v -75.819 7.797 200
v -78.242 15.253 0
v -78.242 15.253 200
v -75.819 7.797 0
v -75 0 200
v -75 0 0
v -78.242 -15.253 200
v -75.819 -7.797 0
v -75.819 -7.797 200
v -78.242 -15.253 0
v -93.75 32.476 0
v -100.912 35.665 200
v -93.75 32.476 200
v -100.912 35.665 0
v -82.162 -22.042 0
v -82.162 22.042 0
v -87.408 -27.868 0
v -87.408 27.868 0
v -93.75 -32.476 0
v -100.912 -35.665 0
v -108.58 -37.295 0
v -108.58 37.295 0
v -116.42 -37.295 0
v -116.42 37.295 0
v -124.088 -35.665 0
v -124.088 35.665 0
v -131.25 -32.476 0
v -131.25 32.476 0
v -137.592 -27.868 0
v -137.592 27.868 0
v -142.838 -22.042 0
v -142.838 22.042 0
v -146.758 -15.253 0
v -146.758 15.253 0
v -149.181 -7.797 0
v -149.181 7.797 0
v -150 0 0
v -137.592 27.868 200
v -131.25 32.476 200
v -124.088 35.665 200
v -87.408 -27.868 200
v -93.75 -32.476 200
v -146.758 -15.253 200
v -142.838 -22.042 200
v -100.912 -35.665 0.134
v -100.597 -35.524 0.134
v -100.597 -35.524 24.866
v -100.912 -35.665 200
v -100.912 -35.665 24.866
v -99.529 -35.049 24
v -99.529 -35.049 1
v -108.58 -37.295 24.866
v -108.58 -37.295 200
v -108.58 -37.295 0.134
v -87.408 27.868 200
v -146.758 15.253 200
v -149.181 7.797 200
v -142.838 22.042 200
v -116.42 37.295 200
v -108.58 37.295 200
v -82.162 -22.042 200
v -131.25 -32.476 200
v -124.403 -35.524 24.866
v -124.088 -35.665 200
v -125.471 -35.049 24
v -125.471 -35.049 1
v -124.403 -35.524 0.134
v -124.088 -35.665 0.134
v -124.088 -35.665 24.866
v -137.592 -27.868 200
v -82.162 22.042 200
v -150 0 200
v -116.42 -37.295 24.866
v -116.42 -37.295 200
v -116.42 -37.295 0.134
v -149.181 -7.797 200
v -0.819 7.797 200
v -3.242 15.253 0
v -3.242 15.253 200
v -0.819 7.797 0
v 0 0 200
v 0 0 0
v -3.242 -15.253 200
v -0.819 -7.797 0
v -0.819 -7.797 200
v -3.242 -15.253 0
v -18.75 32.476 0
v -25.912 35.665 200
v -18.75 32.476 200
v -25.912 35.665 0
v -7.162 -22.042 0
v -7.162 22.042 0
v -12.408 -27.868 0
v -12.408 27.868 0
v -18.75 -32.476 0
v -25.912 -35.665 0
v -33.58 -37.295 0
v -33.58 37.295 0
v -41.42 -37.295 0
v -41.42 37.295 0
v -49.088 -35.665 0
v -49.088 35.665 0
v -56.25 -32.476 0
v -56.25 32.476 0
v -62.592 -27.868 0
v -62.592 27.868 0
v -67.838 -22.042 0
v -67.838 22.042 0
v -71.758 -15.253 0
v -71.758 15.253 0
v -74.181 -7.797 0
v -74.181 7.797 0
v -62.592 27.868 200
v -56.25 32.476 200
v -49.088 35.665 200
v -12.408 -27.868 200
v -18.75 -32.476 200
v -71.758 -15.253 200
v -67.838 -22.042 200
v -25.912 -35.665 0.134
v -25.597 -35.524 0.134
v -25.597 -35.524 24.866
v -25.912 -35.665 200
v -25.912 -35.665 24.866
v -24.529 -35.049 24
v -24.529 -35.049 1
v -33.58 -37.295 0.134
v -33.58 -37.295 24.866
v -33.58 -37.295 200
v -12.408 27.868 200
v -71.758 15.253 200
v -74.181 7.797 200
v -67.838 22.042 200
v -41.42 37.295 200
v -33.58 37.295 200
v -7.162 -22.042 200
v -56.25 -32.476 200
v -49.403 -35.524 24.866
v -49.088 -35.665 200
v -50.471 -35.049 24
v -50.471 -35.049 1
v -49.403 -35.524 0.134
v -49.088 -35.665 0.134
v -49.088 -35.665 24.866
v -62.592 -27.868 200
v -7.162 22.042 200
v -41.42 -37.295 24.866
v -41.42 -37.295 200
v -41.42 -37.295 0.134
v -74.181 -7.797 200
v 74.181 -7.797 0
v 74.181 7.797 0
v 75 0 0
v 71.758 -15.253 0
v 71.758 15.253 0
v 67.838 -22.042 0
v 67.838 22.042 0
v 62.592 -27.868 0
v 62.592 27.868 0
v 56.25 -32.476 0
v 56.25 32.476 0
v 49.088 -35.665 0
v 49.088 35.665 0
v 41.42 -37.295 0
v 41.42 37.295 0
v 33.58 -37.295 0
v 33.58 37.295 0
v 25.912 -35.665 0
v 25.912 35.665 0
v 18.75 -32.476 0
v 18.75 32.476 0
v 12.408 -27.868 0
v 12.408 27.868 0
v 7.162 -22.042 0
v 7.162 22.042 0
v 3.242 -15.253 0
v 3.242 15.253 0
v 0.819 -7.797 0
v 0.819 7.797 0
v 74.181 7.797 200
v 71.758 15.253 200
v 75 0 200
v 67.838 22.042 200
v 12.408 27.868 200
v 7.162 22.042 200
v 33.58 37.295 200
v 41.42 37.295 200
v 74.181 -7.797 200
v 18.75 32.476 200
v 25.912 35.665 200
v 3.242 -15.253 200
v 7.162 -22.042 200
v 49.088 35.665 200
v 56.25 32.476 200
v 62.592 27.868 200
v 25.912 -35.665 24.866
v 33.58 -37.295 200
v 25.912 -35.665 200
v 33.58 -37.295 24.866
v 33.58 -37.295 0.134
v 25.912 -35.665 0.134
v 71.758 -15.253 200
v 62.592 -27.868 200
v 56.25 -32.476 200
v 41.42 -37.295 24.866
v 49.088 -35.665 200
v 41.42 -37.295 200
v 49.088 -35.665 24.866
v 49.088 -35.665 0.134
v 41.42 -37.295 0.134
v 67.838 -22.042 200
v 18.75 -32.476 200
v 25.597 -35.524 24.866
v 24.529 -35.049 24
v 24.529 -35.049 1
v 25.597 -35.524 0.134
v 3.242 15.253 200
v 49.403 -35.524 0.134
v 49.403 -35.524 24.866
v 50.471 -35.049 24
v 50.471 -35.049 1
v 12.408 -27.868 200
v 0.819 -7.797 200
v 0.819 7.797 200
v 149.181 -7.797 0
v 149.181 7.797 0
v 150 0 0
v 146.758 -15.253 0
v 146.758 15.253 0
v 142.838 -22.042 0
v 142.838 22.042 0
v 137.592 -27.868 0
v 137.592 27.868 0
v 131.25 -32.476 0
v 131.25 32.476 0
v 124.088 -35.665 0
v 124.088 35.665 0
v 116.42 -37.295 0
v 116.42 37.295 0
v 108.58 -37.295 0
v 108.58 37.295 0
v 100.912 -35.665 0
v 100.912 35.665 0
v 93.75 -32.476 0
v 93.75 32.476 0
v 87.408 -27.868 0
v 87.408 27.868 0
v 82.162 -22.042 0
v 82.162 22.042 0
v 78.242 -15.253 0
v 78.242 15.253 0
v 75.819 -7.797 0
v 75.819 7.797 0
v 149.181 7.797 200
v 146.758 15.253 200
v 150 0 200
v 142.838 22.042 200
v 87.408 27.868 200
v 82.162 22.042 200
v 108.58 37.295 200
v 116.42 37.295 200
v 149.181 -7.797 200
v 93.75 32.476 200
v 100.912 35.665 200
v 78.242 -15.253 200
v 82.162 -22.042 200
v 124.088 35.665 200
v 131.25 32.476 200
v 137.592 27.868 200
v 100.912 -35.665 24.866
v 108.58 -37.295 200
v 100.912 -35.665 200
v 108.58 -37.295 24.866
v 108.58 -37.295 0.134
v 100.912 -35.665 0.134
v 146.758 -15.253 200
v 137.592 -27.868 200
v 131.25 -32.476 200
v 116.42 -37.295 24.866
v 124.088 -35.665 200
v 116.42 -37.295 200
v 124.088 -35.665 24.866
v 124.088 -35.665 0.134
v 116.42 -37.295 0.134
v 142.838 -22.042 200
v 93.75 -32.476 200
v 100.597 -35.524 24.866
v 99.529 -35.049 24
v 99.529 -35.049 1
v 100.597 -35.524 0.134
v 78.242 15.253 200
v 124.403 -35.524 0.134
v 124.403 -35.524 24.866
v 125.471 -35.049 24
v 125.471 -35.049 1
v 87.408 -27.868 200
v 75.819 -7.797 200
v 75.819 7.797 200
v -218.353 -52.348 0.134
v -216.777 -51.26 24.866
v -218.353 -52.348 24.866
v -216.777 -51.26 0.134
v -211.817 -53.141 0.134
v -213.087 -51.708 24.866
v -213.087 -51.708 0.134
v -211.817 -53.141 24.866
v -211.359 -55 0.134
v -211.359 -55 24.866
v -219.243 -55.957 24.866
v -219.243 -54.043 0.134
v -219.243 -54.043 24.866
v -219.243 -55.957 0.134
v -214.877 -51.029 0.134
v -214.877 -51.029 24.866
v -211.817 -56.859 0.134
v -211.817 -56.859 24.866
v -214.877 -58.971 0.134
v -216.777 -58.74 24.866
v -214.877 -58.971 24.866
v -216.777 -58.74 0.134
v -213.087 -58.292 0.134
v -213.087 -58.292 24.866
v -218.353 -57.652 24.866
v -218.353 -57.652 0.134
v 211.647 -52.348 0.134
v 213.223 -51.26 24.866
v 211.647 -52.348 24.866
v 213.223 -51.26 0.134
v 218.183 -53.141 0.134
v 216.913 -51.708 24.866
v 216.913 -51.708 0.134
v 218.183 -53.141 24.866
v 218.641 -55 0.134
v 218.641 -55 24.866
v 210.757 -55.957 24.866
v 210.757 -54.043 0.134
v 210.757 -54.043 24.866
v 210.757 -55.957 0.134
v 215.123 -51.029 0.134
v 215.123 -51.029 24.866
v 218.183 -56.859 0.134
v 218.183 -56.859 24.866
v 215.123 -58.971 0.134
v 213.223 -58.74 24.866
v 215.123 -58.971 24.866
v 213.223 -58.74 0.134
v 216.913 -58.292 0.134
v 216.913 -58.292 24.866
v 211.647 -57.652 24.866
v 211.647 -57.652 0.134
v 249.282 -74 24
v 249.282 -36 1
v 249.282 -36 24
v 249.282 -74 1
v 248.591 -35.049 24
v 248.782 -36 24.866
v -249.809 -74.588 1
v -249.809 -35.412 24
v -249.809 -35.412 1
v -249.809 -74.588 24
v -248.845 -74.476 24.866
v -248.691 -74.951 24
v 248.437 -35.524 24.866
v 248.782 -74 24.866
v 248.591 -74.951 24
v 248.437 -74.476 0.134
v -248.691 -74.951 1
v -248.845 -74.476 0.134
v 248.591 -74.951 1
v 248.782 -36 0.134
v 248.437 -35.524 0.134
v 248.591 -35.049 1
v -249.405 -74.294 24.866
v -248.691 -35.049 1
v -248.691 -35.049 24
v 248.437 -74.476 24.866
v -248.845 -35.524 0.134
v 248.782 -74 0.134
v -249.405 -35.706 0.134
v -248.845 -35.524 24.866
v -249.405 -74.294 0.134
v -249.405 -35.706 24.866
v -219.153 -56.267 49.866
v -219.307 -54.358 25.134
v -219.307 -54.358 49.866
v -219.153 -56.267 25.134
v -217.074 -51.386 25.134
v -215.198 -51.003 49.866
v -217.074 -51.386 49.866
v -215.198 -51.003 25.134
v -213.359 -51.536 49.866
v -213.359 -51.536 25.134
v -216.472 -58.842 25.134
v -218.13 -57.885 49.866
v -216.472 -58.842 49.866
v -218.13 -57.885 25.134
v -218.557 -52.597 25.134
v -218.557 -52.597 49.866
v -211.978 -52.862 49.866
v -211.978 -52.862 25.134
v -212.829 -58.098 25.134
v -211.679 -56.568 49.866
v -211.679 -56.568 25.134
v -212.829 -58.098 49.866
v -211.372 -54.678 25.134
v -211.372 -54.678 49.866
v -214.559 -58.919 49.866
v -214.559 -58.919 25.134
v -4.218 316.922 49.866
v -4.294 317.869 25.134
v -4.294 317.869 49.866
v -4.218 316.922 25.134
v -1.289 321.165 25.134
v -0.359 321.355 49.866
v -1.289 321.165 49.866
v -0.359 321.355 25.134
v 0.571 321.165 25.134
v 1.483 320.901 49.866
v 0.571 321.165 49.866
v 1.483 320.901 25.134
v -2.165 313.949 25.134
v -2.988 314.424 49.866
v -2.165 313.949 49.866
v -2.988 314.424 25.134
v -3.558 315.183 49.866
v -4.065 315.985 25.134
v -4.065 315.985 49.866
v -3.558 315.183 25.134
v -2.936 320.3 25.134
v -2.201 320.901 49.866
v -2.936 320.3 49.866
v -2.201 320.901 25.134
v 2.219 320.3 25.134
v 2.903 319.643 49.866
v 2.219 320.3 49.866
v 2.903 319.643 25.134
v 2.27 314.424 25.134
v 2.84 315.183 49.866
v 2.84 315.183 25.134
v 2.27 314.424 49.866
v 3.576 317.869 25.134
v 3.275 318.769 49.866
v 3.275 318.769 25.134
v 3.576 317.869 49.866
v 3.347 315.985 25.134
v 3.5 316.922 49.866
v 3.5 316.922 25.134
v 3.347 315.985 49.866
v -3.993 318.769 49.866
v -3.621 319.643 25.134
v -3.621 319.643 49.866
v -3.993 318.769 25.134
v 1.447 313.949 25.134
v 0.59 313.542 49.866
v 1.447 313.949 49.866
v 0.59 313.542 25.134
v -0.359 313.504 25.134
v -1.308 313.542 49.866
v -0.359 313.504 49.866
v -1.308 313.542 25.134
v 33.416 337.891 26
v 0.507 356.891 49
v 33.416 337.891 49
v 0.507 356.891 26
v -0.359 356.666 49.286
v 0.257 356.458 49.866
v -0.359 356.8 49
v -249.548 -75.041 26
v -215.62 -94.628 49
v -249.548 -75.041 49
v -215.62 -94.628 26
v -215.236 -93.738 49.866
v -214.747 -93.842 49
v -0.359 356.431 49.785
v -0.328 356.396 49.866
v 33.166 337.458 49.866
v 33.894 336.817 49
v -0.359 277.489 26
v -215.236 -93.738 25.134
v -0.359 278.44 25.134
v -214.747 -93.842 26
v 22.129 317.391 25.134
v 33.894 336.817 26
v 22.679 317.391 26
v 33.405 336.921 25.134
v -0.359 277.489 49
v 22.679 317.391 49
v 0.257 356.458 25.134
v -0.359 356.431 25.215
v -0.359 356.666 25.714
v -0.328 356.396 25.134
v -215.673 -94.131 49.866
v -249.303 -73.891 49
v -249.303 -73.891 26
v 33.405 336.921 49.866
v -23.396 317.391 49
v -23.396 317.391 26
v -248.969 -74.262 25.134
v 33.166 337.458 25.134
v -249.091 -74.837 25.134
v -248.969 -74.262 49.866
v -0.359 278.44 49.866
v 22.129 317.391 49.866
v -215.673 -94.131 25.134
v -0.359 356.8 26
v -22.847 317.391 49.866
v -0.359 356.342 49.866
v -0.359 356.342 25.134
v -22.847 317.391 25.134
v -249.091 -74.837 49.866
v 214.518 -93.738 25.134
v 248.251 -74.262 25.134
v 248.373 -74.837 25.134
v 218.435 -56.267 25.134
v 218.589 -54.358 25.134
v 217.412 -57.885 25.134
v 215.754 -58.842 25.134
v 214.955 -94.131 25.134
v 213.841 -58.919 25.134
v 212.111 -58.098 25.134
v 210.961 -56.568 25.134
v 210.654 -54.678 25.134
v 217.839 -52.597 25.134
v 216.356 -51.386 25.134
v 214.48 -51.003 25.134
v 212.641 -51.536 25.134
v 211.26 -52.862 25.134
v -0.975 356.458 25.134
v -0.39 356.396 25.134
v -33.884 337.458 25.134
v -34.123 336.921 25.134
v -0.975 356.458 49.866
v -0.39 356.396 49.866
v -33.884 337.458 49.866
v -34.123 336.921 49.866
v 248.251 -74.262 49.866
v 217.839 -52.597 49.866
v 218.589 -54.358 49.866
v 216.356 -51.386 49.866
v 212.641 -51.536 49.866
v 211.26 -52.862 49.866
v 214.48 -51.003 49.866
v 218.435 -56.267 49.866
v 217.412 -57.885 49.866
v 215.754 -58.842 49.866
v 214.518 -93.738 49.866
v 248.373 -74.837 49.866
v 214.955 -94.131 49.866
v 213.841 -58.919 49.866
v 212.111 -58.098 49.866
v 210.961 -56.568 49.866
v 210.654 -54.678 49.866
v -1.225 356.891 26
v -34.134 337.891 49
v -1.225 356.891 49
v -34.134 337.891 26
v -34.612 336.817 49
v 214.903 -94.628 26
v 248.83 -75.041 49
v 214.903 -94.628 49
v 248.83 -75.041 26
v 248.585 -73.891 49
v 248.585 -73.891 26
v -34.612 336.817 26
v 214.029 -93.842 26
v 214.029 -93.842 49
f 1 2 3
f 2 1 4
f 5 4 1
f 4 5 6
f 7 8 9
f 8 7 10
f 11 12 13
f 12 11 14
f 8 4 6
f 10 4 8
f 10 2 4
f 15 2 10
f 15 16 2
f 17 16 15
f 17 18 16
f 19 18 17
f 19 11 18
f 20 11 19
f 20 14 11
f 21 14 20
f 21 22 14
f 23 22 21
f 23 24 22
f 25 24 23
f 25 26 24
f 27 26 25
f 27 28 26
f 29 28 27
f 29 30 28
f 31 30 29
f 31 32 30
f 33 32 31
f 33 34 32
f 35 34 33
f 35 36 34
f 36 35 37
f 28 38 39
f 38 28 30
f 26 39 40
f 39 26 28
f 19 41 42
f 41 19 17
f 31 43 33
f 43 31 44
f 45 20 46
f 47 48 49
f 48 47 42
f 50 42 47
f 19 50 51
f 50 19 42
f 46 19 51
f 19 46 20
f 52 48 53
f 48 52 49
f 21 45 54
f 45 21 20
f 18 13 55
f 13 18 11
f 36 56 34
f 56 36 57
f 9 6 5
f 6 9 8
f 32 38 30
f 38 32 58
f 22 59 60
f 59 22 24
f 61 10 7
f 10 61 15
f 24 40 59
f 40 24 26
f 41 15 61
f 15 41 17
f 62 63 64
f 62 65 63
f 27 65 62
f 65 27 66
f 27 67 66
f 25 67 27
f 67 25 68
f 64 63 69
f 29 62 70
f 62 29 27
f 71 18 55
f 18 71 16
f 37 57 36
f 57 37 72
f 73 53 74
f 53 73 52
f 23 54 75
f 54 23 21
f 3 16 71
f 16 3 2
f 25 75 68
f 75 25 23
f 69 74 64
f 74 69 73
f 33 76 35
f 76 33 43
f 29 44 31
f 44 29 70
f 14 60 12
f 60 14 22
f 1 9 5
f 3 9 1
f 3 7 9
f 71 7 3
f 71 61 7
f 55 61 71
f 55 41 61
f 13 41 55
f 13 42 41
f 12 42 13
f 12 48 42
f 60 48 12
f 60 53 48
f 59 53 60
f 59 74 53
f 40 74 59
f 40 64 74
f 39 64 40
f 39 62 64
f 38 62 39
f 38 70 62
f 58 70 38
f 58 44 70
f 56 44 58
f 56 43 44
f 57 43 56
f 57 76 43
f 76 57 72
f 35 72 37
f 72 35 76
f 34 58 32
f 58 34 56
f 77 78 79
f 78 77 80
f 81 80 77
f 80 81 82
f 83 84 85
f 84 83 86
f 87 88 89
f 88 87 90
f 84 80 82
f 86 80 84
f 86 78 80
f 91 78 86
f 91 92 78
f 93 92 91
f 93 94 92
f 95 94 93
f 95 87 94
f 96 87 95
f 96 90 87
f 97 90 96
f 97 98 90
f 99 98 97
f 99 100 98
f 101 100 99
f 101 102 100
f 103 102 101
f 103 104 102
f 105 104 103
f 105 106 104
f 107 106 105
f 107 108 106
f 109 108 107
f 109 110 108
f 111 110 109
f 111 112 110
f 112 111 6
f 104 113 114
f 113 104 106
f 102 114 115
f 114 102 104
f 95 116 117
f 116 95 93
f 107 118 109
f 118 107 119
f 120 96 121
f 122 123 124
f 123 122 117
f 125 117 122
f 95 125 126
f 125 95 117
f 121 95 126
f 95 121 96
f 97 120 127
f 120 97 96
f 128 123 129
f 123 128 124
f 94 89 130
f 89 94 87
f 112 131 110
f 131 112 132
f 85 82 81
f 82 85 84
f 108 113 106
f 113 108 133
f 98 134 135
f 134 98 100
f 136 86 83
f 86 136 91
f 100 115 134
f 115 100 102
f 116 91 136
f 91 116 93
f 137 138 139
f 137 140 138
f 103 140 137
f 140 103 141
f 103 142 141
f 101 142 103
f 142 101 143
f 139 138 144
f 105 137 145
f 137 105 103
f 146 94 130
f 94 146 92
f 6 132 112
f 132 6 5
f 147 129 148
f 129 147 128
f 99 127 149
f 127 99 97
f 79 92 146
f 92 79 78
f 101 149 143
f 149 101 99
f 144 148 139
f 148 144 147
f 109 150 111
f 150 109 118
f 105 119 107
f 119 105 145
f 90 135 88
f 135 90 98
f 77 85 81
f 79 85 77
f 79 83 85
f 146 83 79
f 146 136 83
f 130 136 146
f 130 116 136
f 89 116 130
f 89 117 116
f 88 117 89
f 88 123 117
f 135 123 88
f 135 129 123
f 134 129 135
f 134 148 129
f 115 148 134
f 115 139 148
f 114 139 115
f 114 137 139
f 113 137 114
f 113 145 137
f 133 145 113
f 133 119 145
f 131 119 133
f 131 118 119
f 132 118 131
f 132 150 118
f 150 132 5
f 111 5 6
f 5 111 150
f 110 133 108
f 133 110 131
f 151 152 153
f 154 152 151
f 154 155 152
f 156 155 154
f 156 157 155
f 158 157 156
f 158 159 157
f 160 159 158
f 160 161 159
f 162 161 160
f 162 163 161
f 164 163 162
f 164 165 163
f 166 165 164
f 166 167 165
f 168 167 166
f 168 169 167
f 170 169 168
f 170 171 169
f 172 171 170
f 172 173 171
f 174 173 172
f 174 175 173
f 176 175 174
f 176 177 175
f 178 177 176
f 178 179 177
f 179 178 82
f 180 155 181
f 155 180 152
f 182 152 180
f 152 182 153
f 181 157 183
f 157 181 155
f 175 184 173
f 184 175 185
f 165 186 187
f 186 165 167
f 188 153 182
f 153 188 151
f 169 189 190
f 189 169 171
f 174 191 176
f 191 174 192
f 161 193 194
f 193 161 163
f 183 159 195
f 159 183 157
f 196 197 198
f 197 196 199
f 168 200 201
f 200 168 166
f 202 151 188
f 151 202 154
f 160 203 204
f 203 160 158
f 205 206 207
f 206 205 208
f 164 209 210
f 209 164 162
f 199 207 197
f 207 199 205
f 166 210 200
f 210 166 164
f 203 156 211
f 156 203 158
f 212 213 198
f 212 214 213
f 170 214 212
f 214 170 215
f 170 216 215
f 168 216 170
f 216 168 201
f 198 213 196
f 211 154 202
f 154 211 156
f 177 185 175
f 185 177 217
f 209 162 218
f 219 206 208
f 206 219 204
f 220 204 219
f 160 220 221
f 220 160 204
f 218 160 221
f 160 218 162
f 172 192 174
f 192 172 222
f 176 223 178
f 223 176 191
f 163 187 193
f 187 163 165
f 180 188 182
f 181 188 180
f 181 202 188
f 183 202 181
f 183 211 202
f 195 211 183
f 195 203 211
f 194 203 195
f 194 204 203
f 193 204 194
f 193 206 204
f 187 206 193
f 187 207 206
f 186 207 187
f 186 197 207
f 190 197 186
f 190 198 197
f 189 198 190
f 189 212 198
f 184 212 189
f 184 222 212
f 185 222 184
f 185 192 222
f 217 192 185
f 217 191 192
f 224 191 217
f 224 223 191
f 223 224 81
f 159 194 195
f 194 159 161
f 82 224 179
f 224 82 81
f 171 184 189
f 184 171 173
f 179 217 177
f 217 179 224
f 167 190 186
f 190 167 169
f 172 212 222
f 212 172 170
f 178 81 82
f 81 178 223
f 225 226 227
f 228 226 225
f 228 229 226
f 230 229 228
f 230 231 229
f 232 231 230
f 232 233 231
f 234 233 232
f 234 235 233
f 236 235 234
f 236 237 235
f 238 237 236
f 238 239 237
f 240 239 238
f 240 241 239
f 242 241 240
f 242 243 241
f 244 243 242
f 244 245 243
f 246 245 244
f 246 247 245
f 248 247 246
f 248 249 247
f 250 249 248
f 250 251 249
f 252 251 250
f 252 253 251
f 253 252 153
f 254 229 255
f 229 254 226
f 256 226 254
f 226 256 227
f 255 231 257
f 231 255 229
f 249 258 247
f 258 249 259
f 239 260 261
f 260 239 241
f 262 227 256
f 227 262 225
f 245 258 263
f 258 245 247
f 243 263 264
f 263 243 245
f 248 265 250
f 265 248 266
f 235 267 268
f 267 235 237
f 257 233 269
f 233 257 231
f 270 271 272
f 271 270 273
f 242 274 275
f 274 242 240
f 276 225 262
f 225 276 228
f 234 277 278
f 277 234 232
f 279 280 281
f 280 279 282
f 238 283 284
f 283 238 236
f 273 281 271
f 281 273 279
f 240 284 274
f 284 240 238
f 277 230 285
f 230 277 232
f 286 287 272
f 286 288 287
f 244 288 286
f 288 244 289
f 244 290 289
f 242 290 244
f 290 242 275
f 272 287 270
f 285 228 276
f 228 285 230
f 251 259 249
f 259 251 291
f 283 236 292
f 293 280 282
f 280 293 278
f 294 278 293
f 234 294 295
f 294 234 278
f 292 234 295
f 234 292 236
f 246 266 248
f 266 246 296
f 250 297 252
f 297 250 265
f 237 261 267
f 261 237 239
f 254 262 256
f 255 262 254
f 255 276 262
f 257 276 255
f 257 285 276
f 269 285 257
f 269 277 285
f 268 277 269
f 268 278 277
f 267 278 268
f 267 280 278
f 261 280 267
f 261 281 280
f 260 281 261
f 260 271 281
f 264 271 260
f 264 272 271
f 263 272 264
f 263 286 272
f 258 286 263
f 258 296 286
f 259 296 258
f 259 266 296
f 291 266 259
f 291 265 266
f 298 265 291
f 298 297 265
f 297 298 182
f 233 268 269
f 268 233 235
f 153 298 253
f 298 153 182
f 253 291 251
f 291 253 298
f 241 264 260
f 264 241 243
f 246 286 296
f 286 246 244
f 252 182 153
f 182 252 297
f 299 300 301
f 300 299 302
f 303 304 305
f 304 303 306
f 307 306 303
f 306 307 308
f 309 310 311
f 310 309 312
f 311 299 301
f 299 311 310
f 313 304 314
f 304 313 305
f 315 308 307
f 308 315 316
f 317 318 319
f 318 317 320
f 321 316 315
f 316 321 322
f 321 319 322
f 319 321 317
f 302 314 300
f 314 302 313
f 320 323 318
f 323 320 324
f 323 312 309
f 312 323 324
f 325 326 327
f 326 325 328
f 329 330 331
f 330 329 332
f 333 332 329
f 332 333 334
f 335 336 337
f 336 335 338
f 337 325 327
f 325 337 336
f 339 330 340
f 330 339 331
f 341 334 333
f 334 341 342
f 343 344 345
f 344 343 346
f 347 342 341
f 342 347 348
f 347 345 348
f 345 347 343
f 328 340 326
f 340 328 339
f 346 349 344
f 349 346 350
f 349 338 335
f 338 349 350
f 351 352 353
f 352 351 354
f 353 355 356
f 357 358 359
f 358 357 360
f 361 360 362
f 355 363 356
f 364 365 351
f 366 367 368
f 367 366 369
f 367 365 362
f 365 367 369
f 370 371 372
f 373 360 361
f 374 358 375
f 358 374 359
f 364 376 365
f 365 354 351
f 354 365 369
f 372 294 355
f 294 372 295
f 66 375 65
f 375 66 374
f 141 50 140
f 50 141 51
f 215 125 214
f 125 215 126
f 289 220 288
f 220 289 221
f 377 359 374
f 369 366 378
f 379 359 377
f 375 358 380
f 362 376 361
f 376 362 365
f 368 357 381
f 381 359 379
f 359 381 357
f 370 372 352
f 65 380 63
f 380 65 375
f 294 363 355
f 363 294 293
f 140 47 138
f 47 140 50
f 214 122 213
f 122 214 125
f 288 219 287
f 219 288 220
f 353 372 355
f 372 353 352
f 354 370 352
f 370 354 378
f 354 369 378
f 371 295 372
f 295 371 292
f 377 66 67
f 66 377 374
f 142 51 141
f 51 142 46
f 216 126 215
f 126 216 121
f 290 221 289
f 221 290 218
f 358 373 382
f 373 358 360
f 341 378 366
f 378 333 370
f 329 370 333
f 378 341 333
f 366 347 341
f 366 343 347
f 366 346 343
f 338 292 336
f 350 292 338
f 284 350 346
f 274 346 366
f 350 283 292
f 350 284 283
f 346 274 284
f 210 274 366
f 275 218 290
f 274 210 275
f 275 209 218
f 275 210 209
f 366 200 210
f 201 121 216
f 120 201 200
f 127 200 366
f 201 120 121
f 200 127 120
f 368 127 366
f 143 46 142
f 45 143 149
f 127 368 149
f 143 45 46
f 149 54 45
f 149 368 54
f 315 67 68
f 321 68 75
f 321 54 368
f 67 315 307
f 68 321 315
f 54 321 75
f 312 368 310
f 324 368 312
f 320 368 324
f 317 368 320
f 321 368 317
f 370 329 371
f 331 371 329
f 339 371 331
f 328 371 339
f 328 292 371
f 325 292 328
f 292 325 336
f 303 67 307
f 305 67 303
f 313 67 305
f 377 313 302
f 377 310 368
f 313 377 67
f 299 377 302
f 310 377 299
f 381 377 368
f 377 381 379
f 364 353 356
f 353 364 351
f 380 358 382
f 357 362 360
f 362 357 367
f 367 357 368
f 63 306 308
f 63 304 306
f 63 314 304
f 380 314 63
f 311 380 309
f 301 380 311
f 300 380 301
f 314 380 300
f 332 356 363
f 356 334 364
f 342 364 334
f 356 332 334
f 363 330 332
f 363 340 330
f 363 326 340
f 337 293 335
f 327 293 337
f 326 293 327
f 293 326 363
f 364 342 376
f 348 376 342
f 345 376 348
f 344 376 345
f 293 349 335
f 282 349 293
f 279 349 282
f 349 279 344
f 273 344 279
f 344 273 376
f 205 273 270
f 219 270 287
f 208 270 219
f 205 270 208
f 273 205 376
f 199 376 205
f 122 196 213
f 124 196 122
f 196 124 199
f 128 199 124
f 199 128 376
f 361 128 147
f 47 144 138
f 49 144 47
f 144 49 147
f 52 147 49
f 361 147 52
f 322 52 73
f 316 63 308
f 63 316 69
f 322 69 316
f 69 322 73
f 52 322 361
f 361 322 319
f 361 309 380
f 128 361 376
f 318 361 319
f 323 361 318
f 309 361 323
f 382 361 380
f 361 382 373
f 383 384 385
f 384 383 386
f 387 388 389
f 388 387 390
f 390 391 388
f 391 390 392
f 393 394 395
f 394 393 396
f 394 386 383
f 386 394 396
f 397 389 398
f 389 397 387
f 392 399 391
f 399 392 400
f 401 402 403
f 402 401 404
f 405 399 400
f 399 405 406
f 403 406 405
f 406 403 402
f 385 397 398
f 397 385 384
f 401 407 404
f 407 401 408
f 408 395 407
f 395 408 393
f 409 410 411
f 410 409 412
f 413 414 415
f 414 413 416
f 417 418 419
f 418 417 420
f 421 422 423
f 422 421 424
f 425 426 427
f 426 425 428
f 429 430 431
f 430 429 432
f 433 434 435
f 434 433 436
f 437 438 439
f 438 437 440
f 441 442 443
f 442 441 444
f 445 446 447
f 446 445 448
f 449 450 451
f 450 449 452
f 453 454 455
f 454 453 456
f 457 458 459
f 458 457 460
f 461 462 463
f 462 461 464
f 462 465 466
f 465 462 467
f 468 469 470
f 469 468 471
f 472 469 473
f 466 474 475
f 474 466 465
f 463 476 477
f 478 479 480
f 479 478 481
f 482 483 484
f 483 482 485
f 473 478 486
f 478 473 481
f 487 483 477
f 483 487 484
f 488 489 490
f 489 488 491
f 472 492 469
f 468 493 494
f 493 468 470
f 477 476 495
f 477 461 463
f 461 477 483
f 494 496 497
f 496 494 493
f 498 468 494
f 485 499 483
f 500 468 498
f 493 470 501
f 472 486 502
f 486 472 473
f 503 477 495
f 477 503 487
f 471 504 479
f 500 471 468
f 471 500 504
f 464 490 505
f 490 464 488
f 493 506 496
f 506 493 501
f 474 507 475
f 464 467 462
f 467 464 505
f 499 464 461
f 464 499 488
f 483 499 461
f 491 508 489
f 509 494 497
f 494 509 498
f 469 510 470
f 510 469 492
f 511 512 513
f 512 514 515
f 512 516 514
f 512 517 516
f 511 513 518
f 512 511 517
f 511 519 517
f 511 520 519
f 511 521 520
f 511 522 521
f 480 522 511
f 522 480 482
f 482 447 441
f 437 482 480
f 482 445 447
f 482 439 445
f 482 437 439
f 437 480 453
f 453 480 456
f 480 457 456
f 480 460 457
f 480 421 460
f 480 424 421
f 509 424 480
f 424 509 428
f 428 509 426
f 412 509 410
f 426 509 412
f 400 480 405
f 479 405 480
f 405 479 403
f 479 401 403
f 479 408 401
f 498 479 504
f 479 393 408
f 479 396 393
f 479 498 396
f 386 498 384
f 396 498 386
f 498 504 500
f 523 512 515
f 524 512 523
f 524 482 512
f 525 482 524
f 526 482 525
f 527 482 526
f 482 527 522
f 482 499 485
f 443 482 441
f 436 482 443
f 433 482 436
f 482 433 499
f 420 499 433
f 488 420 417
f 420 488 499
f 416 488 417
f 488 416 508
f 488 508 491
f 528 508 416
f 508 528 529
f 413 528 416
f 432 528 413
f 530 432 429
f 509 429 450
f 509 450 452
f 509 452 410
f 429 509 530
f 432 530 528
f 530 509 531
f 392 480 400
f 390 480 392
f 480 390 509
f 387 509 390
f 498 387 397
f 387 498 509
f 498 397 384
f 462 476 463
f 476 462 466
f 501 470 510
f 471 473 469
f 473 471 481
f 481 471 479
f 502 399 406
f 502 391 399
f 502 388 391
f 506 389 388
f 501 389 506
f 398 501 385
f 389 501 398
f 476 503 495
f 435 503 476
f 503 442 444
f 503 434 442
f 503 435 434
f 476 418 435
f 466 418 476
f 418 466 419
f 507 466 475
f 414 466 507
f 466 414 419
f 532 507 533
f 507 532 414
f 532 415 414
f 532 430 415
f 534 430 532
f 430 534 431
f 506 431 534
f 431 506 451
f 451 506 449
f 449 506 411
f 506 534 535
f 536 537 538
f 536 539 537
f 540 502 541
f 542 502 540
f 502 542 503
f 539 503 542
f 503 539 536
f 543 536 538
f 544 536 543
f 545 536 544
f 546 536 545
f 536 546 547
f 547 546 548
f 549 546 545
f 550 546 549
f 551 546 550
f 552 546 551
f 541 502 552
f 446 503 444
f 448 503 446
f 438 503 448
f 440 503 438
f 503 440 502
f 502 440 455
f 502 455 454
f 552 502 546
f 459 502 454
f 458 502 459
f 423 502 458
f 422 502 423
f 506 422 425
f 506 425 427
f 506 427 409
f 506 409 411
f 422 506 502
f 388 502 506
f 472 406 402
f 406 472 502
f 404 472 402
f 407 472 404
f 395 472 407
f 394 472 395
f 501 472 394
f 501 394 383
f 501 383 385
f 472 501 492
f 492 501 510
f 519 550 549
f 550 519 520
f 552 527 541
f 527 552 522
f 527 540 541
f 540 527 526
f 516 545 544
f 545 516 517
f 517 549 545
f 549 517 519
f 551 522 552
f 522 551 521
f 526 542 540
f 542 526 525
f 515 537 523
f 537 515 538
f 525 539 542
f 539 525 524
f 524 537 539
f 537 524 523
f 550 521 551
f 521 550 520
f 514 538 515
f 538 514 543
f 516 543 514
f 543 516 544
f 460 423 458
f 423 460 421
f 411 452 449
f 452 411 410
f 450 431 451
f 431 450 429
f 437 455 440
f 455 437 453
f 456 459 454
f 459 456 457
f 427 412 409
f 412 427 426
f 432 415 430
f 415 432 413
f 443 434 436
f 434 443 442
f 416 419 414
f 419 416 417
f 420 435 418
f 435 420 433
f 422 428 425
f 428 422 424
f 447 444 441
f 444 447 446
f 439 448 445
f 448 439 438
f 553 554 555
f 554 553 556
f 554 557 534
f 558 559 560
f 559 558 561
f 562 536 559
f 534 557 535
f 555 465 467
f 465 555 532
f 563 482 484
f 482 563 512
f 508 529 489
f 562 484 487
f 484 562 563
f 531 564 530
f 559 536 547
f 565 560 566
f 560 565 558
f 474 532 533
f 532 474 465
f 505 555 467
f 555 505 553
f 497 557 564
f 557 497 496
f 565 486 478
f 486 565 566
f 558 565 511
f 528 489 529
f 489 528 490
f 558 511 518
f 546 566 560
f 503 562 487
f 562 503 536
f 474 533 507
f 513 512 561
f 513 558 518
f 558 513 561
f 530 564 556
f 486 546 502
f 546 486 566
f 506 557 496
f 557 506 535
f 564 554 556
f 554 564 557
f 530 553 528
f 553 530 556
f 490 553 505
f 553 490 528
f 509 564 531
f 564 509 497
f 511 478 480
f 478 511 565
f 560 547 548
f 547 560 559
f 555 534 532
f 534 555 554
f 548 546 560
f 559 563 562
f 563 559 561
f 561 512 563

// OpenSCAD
//$fs=0.2;
//$fa=0.2;

stl=430;
tw=40;
th=25;


//meretek(stl, tw,th, 1);

uvegmodel();

//allvany(stl,tw,th);

module uvegmodel(){
    for (x=[-75-75/2:75:150]){
        translate([x,0,0])palack();
    }

    translate([-250,-75,0]){
        lec(1,stl,tw,th,1,8);
        translate([cos(30)*tw, -sin(30)*tw,25])rotate([0,0,60]) lec(1,stl,tw,th,1,8);
        translate([2*cos(30)*tw+stl, 0,25])
                rotate([0,0,120]) lec(1,stl,tw,th,1,8);
    }
}
module meretek(stl, tw,th,iv){
    for(ns=[1:5]){
        lec_kalkulator(ns, stl, tw, th, iv);
    }
}


module allvany(stl, tw,th){
    for(l=[0,3*th,6*th]){
        translate([0,0,l])lec(3, stl,tw,th,2,8);
        translate([sin(30)*stl,cos(30)*stl,l])lec(3, stl,tw,th,2,8);
        translate([0,2*cos(30)*stl,l])lec(3, stl,tw,th,2,8);

        for (i =[0:2]){
            translate([cos(30)*tw+i*stl, -sin(30)*tw,l+25])rotate([0,0,60]) lec(2,stl,tw,th,1,8);
        }
        translate([cos(30)*tw+3*stl, -sin(30)*tw,l+th])rotate([0,0,60]) lec(1,stl,tw,th,1,8);

        for (i=[1:3]){
            translate([2*cos(30)*tw+i*stl, 0,l+2*th])
                rotate([0,0,120]) lec(2,stl,tw,th,1,8);
        }
        translate([2*cos(30)*tw+(-sin(30)+4)*stl, cos(30)*stl,l+2*th])
                rotate([0,0,120]) lec(1,stl,tw,th,1,8);
    }

    l=9*th;
    translate([0,0,l])lec(3, stl,tw,th,2,8);
        translate([sin(30)*stl,cos(30)*stl,l])lec(3, stl,tw,th,2,8);
        translate([0,2*cos(30)*stl,l])lec(3, stl,tw,th,2,8);
}

module palack(){
    cylinder(r=75/2, h=200);
}

module lec_kalkulator(ns, stl, tw, th, iv){
 echo("Fizikai hossz:", ns*stl+2*sqrt(3)*tw/2);
 //echo("Belső 3szög oldalhossz:",stl-tw);
}

module lec(ns, stl,tw,th, iv, d)
{
    dx = tw/2*sqrt(3);
    tl = 2*dx+ns*stl;
    l = tl - 2*iv;
    w = tw - 2*iv;
    h = th - 2*iv;
    intersection(){
        translate([iv,iv,iv])
            minkowski(){
                cube([l,w,h]);
                sphere(r=iv);
            }
        difference(){
            cube([tl,tw,th]);
            for(x=[dx:stl:tl]){
                translate([x,tw/2,-10])cylinder(r=d/2, h=th+10);
            }
        }
    }
}
